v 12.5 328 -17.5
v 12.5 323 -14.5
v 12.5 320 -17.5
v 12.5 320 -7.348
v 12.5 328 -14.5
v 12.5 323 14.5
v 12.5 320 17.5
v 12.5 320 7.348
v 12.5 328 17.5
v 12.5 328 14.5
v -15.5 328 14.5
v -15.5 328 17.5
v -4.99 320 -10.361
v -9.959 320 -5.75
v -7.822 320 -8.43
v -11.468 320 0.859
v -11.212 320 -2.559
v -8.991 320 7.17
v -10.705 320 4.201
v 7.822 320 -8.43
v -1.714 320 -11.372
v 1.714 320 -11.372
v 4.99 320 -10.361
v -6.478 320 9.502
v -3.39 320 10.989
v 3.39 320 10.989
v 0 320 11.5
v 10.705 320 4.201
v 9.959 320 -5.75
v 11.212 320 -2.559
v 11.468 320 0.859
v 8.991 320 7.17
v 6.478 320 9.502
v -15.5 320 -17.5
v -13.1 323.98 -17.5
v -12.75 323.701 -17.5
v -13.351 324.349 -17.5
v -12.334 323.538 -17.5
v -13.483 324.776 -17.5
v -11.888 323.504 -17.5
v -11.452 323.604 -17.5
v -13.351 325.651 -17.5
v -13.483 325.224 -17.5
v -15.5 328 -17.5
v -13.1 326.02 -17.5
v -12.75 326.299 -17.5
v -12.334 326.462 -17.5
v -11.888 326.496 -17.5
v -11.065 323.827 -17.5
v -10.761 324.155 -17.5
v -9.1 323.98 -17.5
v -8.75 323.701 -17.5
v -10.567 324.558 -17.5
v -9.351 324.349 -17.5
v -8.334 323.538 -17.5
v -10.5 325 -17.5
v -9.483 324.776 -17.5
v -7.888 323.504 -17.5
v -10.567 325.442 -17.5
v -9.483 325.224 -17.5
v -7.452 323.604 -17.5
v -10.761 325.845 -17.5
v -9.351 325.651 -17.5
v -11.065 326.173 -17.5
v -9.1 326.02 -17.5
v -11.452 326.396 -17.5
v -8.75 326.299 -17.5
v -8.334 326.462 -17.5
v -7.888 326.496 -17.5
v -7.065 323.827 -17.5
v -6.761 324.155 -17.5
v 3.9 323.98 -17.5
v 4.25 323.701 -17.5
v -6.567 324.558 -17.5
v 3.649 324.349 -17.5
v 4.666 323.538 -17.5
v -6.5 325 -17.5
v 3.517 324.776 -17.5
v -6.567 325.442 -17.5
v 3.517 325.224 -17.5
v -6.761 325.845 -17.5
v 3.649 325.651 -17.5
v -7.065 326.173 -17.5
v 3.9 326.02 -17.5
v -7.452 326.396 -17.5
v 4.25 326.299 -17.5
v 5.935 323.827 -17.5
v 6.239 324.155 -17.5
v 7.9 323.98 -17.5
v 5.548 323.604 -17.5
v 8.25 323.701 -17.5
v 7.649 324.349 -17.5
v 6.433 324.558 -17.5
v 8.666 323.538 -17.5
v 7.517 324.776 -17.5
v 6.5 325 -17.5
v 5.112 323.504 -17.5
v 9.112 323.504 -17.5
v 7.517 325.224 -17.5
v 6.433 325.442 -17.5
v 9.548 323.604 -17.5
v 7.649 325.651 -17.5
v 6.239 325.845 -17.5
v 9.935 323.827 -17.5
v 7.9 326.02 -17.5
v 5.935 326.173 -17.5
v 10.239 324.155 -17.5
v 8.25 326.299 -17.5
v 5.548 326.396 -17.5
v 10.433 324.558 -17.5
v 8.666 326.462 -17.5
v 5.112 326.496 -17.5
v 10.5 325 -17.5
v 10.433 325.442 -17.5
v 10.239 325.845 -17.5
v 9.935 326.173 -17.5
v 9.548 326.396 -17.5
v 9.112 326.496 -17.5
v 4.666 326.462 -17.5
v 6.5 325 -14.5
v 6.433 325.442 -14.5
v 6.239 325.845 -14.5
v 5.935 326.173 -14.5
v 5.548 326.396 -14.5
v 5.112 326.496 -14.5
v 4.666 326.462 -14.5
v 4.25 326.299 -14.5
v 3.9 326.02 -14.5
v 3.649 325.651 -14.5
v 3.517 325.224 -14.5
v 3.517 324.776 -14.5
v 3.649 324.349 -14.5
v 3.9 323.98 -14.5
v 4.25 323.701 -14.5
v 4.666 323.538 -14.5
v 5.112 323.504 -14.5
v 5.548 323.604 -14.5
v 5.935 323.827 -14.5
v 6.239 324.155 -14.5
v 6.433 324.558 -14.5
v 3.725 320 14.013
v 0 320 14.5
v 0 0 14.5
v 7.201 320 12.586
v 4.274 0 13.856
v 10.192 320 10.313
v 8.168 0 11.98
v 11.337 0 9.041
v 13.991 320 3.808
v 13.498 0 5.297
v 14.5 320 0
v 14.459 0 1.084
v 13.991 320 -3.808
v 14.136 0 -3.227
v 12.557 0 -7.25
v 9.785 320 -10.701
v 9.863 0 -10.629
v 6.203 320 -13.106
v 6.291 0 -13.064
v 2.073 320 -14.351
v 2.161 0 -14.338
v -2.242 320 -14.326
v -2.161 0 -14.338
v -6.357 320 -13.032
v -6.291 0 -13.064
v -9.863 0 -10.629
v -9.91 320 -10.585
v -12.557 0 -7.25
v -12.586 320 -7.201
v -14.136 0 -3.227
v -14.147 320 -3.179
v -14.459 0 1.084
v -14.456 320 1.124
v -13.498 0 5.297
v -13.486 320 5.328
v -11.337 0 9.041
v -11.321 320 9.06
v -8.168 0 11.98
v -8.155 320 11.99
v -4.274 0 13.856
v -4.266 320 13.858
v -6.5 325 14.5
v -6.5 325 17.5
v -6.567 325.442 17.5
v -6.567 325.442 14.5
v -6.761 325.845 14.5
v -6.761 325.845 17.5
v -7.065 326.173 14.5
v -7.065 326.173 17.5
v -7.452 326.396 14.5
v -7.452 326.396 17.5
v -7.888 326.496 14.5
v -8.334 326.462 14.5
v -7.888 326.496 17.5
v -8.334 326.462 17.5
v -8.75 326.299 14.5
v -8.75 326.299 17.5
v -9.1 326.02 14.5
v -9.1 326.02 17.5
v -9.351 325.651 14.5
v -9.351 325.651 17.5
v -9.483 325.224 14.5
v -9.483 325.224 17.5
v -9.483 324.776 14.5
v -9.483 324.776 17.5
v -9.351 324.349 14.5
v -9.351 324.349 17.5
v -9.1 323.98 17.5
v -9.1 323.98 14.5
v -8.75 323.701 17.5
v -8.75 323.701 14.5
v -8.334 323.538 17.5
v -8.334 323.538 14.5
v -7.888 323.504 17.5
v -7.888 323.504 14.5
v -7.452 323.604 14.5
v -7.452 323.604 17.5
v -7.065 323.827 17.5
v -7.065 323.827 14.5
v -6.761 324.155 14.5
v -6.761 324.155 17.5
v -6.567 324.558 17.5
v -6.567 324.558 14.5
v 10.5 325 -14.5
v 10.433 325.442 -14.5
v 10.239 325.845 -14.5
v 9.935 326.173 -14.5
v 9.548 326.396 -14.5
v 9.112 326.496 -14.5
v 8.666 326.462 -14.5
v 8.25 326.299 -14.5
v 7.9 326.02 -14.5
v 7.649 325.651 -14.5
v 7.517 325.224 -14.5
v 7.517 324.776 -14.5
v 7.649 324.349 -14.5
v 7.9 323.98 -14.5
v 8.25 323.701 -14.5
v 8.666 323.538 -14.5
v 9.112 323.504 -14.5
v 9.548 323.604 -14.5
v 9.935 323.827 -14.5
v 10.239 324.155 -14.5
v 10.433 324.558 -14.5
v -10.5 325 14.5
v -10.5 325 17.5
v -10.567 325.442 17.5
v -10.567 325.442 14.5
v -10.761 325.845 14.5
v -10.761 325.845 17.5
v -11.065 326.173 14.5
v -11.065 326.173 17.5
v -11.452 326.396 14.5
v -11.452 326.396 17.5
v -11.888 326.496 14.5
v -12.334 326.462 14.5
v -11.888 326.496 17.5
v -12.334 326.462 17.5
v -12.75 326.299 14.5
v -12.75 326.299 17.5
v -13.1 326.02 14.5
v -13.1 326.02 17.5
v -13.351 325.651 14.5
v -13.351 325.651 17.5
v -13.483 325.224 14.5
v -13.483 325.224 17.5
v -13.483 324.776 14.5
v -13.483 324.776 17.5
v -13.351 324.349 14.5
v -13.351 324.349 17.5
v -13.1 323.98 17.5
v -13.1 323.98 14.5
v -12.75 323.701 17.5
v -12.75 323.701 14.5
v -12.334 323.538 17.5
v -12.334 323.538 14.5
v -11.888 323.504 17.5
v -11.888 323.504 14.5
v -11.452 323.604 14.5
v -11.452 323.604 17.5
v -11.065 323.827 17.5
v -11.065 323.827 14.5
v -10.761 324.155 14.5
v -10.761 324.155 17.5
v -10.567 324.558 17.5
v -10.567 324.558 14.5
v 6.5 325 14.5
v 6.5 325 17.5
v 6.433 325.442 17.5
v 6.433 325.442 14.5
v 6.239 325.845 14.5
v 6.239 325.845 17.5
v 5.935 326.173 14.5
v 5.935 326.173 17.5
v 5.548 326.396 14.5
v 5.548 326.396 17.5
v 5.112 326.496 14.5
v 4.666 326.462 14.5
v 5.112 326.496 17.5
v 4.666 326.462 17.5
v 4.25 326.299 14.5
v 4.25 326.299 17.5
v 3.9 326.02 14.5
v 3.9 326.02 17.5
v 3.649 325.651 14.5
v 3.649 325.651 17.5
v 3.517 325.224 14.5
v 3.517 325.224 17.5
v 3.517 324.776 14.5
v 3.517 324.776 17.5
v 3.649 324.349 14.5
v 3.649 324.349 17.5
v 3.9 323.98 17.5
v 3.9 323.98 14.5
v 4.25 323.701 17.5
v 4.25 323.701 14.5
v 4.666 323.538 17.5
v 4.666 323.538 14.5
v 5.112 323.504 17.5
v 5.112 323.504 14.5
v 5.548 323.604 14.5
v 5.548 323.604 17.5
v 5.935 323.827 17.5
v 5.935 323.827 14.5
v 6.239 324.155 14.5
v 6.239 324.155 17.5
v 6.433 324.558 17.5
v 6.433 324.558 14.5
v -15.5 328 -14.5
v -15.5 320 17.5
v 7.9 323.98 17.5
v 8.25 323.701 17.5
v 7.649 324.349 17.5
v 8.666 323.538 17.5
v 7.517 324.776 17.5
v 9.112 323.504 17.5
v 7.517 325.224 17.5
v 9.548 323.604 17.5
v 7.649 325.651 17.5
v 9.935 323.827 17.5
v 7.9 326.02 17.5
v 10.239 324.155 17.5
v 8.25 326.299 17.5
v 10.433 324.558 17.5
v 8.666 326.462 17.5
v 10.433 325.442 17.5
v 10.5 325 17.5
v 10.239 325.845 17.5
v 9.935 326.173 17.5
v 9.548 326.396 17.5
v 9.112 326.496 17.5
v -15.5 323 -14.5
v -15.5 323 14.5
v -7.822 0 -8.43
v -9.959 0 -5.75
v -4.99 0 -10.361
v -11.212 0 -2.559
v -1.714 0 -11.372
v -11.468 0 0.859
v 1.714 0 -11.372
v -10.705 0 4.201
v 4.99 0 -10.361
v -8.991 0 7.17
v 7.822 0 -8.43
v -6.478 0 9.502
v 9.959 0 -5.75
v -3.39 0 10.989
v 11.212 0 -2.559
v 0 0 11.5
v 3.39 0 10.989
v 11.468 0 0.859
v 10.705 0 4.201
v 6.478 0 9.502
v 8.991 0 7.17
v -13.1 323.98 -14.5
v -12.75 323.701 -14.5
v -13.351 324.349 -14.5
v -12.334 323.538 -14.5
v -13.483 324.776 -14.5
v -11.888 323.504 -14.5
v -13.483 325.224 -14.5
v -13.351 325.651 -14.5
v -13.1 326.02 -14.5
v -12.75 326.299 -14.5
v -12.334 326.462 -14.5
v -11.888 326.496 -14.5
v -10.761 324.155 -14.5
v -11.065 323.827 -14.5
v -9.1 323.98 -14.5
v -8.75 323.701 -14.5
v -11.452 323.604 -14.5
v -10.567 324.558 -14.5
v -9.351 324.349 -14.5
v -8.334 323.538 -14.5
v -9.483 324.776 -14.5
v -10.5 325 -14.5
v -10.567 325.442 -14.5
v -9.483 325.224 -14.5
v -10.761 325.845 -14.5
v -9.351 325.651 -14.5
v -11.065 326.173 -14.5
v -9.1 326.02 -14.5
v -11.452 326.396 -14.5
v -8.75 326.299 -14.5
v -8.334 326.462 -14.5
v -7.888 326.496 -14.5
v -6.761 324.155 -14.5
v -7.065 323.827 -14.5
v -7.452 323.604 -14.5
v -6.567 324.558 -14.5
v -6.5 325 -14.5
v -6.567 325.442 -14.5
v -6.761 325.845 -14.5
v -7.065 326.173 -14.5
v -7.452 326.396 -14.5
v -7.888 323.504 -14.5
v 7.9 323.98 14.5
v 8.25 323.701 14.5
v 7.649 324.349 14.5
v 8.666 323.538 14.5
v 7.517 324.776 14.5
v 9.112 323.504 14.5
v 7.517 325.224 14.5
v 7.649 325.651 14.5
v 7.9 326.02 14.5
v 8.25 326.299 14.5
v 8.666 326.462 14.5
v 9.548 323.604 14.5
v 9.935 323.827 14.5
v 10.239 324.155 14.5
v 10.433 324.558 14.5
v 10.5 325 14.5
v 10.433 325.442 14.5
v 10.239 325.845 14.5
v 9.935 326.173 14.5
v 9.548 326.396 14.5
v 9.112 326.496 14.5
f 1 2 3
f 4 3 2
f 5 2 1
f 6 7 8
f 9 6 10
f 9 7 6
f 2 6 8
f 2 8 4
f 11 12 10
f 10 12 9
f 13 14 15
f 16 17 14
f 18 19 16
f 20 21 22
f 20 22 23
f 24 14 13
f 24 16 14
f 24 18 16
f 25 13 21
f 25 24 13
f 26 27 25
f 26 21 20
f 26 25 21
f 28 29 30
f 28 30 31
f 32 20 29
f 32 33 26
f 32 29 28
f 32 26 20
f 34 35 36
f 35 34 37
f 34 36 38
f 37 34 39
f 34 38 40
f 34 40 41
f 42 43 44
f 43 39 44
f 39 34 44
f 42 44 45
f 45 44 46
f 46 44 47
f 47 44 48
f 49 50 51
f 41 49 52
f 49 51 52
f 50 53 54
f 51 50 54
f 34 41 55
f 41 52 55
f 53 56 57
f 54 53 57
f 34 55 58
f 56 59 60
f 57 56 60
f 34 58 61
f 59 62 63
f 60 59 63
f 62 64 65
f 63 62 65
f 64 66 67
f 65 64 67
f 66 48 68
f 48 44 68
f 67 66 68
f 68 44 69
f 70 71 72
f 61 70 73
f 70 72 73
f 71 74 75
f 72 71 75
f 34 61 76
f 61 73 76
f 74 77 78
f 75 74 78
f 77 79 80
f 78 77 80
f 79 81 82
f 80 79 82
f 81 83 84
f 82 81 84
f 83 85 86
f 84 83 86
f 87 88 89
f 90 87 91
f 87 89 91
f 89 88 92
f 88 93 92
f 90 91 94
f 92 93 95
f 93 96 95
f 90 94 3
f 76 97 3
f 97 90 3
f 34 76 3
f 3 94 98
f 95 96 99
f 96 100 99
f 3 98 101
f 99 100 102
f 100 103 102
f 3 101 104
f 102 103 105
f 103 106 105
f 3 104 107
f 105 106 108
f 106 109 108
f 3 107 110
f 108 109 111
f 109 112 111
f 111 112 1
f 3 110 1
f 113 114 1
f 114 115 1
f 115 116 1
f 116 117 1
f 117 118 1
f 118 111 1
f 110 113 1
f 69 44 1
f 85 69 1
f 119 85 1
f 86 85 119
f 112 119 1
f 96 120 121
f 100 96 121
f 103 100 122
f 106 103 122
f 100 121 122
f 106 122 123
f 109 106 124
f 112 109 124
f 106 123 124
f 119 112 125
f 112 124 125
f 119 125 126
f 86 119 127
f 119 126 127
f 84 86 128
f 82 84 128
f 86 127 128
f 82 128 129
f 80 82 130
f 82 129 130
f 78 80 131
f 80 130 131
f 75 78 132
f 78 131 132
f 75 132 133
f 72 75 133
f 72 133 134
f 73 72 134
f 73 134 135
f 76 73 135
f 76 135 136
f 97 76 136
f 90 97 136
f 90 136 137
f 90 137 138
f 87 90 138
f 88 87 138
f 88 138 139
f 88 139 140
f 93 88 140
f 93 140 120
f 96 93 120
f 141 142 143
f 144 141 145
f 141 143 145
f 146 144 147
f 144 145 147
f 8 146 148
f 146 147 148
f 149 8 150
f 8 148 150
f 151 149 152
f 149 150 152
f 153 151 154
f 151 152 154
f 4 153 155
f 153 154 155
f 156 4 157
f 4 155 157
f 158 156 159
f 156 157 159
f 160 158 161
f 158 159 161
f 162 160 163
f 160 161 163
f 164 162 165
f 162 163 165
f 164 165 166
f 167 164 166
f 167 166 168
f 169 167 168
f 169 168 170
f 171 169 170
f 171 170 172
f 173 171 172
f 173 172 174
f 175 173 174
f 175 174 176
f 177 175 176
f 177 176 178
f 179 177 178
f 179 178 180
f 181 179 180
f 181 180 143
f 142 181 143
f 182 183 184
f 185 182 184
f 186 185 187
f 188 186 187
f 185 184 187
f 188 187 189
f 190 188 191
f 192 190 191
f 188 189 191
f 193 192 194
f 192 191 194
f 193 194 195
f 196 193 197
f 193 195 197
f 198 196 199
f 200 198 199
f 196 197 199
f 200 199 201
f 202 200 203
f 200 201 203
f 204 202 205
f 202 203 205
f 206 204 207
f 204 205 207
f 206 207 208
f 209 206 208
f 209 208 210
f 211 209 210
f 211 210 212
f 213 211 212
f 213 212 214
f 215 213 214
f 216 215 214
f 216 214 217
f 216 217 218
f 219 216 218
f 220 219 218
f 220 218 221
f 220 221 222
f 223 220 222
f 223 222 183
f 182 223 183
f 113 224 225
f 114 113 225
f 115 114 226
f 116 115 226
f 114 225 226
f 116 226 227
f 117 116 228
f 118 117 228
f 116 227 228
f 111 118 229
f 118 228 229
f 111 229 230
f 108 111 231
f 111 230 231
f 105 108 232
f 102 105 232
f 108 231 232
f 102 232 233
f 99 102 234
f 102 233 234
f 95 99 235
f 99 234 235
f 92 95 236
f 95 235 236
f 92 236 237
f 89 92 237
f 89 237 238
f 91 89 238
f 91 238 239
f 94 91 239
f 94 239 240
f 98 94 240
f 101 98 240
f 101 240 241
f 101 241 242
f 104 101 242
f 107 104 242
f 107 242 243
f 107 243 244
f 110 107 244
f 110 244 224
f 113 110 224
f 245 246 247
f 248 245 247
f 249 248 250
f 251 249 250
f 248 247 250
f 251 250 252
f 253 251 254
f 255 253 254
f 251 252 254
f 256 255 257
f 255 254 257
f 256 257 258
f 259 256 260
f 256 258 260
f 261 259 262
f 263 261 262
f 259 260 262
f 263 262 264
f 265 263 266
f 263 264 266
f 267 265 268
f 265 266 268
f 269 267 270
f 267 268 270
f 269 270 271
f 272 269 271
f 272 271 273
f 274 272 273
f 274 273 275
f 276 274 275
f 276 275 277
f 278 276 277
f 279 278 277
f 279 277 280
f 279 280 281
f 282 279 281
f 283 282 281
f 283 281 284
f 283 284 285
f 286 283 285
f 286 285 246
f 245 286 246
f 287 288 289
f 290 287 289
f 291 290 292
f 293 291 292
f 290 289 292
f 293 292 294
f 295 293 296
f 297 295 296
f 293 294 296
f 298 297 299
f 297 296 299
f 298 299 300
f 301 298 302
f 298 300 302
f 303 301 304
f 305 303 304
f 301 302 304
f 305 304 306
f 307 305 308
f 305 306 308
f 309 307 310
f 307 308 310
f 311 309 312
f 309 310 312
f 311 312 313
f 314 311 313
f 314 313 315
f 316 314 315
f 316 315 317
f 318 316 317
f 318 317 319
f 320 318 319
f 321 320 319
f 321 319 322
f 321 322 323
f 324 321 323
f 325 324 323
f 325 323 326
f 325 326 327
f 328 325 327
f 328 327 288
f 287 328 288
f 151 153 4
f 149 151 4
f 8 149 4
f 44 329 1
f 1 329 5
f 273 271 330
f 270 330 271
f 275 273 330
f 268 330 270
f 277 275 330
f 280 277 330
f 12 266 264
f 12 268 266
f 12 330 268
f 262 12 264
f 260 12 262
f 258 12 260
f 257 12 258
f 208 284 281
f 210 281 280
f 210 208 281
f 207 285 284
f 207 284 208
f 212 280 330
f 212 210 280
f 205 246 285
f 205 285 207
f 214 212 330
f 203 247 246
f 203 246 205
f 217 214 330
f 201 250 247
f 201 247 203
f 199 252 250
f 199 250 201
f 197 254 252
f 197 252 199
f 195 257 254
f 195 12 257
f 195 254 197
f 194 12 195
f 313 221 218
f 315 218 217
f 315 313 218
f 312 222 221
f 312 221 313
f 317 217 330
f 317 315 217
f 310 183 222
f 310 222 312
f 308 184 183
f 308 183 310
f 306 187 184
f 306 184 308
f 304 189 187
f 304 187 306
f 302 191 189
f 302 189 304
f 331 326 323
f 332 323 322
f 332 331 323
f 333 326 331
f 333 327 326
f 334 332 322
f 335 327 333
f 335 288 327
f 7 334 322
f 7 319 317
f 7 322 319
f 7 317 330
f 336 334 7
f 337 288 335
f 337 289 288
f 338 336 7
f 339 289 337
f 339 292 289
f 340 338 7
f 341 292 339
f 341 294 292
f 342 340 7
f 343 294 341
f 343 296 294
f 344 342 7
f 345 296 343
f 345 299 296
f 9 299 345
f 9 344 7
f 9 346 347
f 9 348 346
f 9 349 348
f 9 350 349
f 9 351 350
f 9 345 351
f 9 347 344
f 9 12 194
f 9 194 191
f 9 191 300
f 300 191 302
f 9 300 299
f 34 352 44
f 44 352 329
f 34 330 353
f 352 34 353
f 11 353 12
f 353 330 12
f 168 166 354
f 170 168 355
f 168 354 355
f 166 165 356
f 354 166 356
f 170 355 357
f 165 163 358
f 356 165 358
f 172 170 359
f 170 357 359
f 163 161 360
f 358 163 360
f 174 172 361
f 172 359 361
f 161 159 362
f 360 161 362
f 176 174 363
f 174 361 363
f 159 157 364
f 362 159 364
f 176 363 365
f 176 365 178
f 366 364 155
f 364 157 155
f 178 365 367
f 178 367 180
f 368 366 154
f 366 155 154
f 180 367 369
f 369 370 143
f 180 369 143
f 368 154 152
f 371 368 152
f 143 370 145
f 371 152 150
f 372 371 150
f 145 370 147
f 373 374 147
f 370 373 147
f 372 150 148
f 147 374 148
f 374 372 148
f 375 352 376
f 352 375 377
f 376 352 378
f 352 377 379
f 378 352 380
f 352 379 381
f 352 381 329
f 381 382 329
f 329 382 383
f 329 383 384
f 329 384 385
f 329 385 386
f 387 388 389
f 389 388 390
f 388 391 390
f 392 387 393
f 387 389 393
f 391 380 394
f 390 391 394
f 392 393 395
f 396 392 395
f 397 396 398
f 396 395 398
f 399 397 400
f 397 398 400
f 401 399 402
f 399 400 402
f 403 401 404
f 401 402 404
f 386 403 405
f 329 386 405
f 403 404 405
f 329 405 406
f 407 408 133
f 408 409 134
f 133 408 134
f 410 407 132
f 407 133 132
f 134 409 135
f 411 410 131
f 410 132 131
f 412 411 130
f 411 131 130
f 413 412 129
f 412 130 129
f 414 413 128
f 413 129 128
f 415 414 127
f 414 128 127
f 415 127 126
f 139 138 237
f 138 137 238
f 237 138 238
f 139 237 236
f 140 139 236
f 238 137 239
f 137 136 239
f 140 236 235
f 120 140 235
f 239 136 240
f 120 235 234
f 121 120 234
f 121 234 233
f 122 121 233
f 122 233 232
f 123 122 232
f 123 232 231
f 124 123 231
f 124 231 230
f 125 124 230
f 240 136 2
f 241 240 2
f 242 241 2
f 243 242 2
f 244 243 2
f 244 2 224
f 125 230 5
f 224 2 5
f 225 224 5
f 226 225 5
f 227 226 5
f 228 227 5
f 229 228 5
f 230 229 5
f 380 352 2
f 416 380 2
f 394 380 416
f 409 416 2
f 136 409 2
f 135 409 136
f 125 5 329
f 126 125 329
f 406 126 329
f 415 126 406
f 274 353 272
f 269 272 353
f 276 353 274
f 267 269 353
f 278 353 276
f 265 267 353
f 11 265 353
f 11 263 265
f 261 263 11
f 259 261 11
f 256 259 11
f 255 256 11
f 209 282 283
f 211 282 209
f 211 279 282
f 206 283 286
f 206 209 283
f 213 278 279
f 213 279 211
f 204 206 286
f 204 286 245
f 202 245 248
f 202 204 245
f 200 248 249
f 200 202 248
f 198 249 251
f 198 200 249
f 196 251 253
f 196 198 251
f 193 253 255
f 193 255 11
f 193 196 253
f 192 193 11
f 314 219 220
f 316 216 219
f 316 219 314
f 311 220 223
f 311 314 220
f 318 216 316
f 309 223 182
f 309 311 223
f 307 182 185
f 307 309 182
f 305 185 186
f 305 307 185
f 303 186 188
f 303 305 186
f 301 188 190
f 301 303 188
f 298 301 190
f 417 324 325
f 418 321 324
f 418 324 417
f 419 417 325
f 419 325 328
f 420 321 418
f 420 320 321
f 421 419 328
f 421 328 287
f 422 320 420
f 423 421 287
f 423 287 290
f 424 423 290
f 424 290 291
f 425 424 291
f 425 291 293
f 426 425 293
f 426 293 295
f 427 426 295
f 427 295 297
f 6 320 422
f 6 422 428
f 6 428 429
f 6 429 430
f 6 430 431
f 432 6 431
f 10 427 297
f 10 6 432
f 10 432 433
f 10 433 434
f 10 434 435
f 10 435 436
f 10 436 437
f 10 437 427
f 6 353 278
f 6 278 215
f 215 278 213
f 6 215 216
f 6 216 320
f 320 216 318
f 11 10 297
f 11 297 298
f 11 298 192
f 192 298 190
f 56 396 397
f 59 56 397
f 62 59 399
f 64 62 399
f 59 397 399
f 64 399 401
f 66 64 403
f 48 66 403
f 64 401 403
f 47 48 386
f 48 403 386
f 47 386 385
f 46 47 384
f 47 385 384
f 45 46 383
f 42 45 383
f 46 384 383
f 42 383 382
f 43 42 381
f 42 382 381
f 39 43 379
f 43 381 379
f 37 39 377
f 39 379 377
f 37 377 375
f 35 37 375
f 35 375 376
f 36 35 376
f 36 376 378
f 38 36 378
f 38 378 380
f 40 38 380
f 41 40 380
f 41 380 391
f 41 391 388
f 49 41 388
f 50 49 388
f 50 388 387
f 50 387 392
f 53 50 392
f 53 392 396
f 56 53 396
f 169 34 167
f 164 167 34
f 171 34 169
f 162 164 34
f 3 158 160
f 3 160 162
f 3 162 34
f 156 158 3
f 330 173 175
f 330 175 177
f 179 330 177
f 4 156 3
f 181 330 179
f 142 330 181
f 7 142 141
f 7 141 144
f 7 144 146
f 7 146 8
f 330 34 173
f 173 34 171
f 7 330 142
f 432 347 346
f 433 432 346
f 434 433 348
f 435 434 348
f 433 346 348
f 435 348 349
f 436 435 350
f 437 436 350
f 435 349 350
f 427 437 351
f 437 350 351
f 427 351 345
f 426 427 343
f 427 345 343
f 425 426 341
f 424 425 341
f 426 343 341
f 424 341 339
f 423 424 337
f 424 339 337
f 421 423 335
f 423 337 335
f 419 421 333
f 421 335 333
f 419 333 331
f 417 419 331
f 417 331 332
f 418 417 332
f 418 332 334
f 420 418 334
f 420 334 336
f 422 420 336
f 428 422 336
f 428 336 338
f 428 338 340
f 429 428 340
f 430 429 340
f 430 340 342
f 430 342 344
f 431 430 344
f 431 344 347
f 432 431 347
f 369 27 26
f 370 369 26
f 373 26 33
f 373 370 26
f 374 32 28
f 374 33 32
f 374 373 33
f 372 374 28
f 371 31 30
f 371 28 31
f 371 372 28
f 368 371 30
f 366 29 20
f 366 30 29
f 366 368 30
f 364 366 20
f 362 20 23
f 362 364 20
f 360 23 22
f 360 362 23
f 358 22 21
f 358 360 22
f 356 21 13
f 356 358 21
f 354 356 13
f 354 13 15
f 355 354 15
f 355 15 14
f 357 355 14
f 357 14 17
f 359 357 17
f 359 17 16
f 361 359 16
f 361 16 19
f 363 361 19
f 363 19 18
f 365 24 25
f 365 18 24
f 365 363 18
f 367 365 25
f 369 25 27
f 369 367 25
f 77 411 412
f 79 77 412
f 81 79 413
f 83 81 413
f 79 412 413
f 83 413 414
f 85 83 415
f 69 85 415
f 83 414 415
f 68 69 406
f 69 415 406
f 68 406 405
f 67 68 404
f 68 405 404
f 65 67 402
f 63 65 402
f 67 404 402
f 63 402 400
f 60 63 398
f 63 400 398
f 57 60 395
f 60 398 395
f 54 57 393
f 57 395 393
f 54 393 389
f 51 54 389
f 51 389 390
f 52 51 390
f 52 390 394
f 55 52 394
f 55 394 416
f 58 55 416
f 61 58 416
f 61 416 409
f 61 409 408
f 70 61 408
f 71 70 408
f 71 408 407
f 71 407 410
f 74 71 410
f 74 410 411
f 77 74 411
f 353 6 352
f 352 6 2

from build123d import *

# Parameters (mm, degrees)
SKETCH1_R           = 14.5
BOSS_EXTRUDE1_DEPTH = 320
SHELL1_T            = -3
SKETCH2_W           = 28
SKETCH2_H           = 8
BOSS_EXTRUDE2_DEPTH = 17.5
SKETCH4_W           = 29
SKETCH4_H           = 5
CUT_EXTRUDE1_DEPTH  = 28
CUT_EXTRUDE2_REACH  = 332.226
SKETCH5_R           = 1.5


with BuildPart() as part:
    # Sketch1 → Boss-Extrude1 (new body)
    with BuildSketch(Plane(origin=(0, 0, 0), x_dir=(1, 0, 0), z_dir=(0, 1, 0))):
        with Locations(Location((0, 0, 0), (0, 0, 270))):
            Circle(SKETCH1_R)
    extrude(amount=BOSS_EXTRUDE1_DEPTH)

    # Shell1
    shell1_openings = [part.faces().sort_by_distance(p)[0] for p in [
        (0, 320, 0),
        (0, 0, 0),
    ]]
    offset(amount=SHELL1_T, openings=shell1_openings, kind=Kind.INTERSECTION)

    # Sketch2 → Boss-Extrude2 (add, symmetric)
    with BuildSketch(Plane.XY):
        with Locations((-1.5, 324)):
            Rectangle(SKETCH2_W, SKETCH2_H)
    extrude(amount=BOSS_EXTRUDE2_DEPTH, both=True)

    # Sketch4 → Cut-Extrude1 (cut)
    with BuildSketch(Plane(origin=(12.5, 0, 0), x_dir=(0, 0, -1), z_dir=(1, 0, 0))):
        with Locations((0, 325.5)):
            Rectangle(SKETCH4_W, SKETCH4_H)
    extrude(amount=-CUT_EXTRUDE1_DEPTH, mode=Mode.SUBTRACT)

    # Cut-Extrude2: up to this face of the body (flat: up to its plane)
    cut_extrude2_end = Plane(part.part.faces().sort_by_distance((-1.5, 324, -17.5))[0])
    # Sketch5 → Cut-Extrude2 (cut, up to the picked face)
    with BuildSketch(Plane.XY.offset(17.5), mode=Mode.PRIVATE) as cut_extrude2_sk1:
        with Locations((-8, 325)):
            Circle(SKETCH5_R)
    cut_extrude2_tool1 = split(extrude(cut_extrude2_sk1.sketch, amount=-CUT_EXTRUDE2_REACH, mode=Mode.PRIVATE), bisect_by=cut_extrude2_end, keep=Keep.BOTH, mode=Mode.PRIVATE)
    # Sketch5 → Cut-Extrude2 (cut, up to the picked face)
    with BuildSketch(Plane.XY.offset(17.5), mode=Mode.PRIVATE) as cut_extrude2_sk2:
        with Locations((5, 325)):
            Circle(SKETCH5_R)
    cut_extrude2_tool2 = split(extrude(cut_extrude2_sk2.sketch, amount=-CUT_EXTRUDE2_REACH, mode=Mode.PRIVATE), bisect_by=cut_extrude2_end, keep=Keep.BOTH, mode=Mode.PRIVATE)
    # Sketch5 → Cut-Extrude2 (cut, up to the picked face)
    with BuildSketch(Plane.XY.offset(17.5), mode=Mode.PRIVATE) as cut_extrude2_sk3:
        with Locations((9, 325)):
            Circle(SKETCH5_R)
    cut_extrude2_tool3 = split(extrude(cut_extrude2_sk3.sketch, amount=-CUT_EXTRUDE2_REACH, mode=Mode.PRIVATE), bisect_by=cut_extrude2_end, keep=Keep.BOTH, mode=Mode.PRIVATE)
    # Sketch5 → Cut-Extrude2 (cut, up to the picked face)
    with BuildSketch(Plane.XY.offset(17.5), mode=Mode.PRIVATE) as cut_extrude2_sk4:
        with Locations((-12, 325)):
            Circle(SKETCH5_R)
    cut_extrude2_tool4 = split(extrude(cut_extrude2_sk4.sketch, amount=-CUT_EXTRUDE2_REACH, mode=Mode.PRIVATE), bisect_by=cut_extrude2_end, keep=Keep.BOTH, mode=Mode.PRIVATE)
    add(cut_extrude2_tool1.solids().sort_by(Axis((-8, 325, 17.5), (0, 0, -1)))[0], mode=Mode.SUBTRACT)
    add(cut_extrude2_tool2.solids().sort_by(Axis((5, 325, 17.5), (0, 0, -1)))[0], mode=Mode.SUBTRACT)
    add(cut_extrude2_tool3.solids().sort_by(Axis((9, 325, 17.5), (0, 0, -1)))[0], mode=Mode.SUBTRACT)
    add(cut_extrude2_tool4.solids().sort_by(Axis((-12, 325, 17.5), (0, 0, -1)))[0], mode=Mode.SUBTRACT)


solid = part.part
